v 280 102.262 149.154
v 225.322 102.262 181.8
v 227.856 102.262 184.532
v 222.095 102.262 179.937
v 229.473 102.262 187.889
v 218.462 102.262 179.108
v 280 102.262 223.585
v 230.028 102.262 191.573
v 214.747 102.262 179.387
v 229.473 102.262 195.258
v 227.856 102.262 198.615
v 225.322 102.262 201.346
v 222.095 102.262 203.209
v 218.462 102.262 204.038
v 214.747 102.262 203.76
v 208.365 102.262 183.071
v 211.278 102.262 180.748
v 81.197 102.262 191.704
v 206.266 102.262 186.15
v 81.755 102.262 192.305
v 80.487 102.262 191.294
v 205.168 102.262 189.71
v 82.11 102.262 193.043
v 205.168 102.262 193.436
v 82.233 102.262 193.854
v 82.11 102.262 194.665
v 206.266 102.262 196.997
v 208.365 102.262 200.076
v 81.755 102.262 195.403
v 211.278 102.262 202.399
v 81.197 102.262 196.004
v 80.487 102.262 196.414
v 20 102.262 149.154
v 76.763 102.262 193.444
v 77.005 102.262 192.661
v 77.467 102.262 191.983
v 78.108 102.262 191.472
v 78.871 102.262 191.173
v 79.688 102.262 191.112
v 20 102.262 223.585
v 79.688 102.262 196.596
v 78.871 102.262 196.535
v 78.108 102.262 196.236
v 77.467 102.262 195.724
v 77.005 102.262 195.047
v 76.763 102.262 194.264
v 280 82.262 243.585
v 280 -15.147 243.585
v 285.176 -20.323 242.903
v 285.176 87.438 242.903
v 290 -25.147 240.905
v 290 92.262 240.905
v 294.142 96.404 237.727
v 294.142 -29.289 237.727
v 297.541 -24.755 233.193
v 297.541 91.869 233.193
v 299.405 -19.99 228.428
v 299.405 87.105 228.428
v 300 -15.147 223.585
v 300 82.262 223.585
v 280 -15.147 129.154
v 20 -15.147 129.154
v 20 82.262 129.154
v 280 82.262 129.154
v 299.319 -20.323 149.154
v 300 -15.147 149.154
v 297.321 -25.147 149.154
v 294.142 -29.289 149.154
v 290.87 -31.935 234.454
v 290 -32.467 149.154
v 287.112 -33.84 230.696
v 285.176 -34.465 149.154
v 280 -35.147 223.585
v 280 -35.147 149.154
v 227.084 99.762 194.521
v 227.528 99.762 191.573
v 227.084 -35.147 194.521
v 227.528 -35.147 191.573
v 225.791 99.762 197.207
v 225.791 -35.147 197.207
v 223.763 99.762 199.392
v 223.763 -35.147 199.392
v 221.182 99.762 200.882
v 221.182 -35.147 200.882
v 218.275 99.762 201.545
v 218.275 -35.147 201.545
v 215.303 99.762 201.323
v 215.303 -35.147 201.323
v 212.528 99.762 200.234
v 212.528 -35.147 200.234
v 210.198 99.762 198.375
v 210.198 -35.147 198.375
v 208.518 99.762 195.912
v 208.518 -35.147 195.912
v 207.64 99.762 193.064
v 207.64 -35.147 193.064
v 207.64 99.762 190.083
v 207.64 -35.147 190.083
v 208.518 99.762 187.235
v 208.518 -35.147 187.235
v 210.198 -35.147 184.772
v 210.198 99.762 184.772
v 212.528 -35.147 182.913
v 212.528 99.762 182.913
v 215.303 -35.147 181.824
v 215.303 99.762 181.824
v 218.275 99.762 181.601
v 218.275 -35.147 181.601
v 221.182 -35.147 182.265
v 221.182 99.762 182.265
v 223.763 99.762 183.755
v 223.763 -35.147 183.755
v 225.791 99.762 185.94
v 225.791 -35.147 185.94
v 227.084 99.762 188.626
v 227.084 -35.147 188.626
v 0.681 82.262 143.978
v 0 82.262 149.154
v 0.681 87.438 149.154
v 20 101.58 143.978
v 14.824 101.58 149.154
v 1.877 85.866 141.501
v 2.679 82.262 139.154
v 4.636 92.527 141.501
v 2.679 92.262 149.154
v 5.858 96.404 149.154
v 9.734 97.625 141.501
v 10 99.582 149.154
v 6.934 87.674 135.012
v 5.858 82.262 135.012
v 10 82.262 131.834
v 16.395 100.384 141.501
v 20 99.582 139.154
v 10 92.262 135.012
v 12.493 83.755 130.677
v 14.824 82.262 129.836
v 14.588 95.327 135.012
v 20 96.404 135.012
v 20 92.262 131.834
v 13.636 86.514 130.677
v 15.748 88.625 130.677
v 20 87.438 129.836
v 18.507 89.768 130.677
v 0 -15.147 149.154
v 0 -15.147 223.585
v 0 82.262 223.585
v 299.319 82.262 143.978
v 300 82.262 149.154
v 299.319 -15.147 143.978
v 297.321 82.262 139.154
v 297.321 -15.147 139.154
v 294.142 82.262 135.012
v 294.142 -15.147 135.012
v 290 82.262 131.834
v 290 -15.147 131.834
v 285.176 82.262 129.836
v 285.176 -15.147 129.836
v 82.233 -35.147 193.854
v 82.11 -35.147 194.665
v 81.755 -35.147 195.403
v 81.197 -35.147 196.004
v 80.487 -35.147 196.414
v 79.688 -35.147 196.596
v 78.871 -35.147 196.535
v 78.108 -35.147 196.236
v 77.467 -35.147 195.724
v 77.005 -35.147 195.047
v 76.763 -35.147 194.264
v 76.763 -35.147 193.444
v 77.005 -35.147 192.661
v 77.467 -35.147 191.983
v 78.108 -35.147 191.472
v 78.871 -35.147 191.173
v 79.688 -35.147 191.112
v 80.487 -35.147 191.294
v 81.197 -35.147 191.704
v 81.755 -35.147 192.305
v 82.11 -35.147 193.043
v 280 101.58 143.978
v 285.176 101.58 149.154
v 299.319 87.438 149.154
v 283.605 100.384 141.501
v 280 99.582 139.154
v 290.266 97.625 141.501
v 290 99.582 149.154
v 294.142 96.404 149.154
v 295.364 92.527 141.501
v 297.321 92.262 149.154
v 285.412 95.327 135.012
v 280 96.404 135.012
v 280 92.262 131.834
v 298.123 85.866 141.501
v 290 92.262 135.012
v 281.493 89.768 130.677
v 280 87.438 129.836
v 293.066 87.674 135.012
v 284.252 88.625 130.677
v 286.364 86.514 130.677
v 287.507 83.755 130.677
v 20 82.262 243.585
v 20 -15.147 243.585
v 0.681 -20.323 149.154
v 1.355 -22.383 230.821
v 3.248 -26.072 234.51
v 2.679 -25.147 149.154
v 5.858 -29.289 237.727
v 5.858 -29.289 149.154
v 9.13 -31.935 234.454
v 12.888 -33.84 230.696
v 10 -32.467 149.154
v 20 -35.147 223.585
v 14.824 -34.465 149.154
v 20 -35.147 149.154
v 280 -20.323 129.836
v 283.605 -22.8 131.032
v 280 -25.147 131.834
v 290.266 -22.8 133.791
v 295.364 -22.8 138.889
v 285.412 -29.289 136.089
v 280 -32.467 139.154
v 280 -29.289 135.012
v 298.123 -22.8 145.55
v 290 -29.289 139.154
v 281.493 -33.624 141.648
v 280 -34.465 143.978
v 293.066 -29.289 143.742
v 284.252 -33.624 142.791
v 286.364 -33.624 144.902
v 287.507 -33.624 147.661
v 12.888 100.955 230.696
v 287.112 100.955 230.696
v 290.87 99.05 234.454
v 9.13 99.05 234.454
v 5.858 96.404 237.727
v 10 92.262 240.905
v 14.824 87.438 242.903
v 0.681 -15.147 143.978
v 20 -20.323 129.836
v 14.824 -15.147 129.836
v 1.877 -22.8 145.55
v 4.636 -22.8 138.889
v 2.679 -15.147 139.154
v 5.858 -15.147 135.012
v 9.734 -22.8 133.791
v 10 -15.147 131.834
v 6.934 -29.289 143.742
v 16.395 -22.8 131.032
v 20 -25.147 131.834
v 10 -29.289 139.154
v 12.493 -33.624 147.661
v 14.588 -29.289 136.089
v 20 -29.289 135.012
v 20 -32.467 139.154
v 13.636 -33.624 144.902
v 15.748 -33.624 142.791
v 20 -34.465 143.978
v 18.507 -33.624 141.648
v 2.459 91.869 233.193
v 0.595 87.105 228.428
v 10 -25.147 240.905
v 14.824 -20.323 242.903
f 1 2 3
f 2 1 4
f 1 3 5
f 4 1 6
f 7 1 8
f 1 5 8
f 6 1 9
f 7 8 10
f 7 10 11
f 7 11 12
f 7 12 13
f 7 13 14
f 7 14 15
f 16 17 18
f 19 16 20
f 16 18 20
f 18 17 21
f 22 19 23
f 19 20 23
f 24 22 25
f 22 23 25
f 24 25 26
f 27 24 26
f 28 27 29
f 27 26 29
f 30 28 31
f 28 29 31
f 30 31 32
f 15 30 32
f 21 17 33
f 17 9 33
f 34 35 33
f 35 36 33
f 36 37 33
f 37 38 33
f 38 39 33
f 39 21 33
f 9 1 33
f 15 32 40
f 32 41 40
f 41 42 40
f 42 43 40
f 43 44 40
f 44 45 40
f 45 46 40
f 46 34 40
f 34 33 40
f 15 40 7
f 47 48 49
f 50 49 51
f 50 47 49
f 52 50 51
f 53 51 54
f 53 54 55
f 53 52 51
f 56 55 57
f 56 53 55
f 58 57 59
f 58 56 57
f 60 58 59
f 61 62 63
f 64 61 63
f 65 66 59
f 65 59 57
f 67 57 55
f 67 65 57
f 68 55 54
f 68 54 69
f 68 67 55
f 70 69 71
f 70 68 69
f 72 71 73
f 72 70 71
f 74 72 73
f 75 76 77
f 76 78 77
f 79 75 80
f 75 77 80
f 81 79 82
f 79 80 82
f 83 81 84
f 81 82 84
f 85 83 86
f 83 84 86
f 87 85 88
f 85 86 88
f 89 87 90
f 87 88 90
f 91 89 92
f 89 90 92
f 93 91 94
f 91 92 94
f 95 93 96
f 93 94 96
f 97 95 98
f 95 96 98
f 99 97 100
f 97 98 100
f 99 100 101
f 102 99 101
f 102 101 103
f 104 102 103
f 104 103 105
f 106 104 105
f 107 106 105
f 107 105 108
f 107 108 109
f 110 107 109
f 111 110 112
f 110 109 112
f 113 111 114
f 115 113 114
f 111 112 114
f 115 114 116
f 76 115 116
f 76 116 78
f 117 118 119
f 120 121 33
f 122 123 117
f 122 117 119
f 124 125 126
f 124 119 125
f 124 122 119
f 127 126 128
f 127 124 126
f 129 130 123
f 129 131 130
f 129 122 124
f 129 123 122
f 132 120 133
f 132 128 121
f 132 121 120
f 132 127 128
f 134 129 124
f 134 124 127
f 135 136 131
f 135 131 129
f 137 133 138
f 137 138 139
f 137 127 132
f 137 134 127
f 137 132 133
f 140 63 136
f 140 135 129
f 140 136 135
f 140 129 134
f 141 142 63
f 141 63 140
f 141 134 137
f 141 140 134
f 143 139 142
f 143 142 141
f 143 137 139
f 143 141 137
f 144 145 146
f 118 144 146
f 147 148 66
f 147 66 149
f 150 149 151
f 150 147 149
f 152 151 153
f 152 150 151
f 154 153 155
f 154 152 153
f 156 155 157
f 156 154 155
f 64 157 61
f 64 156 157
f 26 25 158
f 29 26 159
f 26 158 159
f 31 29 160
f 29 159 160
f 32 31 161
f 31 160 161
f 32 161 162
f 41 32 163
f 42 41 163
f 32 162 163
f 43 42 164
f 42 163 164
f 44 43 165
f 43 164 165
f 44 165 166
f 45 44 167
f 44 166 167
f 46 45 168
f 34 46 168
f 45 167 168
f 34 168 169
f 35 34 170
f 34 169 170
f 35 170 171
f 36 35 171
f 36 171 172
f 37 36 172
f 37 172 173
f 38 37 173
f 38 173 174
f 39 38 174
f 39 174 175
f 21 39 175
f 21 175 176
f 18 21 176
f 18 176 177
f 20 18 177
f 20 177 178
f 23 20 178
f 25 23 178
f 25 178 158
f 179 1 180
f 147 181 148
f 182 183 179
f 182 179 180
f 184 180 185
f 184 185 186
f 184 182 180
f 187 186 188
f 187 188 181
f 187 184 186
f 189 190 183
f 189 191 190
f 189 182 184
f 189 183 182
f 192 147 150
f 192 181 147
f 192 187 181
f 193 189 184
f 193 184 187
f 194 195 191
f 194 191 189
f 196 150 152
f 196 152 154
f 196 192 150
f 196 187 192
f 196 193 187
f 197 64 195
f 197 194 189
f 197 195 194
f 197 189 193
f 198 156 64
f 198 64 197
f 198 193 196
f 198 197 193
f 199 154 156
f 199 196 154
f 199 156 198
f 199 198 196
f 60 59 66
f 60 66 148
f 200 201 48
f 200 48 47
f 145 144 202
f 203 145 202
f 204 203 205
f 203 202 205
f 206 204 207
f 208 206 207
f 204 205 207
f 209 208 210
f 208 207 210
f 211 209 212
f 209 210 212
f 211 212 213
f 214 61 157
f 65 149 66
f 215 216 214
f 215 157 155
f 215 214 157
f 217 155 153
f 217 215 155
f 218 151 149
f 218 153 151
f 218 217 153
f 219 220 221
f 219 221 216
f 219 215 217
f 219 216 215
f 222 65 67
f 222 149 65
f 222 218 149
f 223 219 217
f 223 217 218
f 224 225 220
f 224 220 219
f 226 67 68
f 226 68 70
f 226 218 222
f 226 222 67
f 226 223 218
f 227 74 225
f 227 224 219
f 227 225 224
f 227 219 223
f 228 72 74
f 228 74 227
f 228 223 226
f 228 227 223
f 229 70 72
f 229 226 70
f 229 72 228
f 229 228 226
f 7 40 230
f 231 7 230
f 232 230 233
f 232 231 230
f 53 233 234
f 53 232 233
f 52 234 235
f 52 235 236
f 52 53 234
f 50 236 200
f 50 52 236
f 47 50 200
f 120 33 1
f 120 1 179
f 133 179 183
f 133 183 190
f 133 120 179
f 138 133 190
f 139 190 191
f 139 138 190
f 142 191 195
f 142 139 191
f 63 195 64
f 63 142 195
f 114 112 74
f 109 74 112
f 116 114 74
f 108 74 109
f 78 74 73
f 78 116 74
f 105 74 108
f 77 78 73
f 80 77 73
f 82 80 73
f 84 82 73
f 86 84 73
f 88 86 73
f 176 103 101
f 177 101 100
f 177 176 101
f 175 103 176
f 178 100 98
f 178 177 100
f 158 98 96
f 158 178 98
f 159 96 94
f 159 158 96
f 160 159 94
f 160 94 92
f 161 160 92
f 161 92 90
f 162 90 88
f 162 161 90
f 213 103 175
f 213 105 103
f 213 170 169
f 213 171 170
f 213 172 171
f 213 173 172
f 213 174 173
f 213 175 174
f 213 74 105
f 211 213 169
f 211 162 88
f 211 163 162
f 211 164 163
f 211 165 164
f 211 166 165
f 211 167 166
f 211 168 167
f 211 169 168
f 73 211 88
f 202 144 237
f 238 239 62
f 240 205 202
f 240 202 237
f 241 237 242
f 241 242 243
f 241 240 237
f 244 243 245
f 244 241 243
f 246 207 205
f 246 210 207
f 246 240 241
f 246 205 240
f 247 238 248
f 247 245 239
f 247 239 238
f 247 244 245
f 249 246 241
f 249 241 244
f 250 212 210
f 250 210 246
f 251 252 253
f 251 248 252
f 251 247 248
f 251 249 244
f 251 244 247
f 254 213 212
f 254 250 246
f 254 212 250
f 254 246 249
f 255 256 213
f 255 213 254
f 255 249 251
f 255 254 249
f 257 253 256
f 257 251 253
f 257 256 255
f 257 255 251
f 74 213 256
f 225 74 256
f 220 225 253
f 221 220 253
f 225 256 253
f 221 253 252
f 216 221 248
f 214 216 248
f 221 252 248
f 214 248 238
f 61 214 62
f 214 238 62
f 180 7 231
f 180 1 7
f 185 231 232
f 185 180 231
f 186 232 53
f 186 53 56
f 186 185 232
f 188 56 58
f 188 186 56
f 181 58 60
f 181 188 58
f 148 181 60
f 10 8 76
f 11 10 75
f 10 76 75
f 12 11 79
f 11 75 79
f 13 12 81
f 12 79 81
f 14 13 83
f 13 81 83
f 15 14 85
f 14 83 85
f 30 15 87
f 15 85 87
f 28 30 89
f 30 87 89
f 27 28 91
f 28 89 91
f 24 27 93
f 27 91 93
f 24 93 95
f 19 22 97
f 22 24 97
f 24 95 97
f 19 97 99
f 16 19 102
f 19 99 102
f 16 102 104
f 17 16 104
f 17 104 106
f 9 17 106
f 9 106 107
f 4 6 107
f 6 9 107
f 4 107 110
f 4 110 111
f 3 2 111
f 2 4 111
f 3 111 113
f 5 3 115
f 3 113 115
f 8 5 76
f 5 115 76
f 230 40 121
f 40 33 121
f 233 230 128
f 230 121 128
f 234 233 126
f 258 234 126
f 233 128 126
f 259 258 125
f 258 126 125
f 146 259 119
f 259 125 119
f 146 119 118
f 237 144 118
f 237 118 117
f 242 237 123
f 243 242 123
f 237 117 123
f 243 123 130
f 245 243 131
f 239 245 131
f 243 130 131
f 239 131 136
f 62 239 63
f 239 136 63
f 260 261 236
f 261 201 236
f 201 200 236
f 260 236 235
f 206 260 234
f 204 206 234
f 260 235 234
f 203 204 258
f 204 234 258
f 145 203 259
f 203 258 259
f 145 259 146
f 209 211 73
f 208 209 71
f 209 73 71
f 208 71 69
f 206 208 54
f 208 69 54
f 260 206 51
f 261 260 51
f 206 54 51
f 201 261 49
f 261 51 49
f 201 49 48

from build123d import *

# Parameters (mm, degrees)
F0_W           = 137.4083533883
F0_H           = 114.4303381443
F1_DEPTH       = 300
F2_R           = 20
F3_T1_DEPTH    = 124.4303381443
F3_T3_DEPTH    = 97.4083533883
F3_T5_DEPTH    = 260
F3_S9_W        = 20.4
F3_S9_H        = 20.4
F3_T10_DEPTH   = 20.4
F3_S15_W       = 20.4
F3_S15_H       = 20.4
F3_T16_DEPTH   = 20.4
F3_S21_W       = 20.4
F3_S21_H       = 20.4
F3_T22_DEPTH   = 20.4
F3_S27_W       = 20.4
F3_S27_H       = 20.4
F3_T28_DEPTH   = 20.4
F5_D           = 5.5
F7_D           = 20
F7_CSINK_D     = 25
F7_CSINK_ANGLE = 90


# Not quite as in the source:
# - a fillet or chamfer that OpenCascade refuses, or shapes differently, is made with other operations: its cross-section is extruded or revolved along the edge and cut away or added


with BuildPart() as f1:
    # F0 (on Right) → F1 (new body)
    with BuildSketch(Plane.YZ):
        with Locations((33.5574410856, 186.369523406)):
            Rectangle(F0_W, F0_H)
    extrude(amount=F1_DEPTH)

    # F2
    f2_edges = [f1.edges().sort_by_distance(p)[0] for p in [
        (150, 102.261618, 243.584692),
        (150, -35.146736, 243.584692),
        (0, 33.557441, 243.584692),
        (300, 33.557441, 243.584692),
    ]]
    fillet(f2_edges, radius=F2_R)

    # F3: fillet of radius 20 on 9 edges, made by hand

    # F3_s2 → F3_t1 (cut)
    with BuildSketch(Plane.XY.offset(149.1543543339)):
        with BuildLine():
            ThreePointArc((0, -15.1467356086), (5.8578643763, -29.2888712323), (20, -35.1467356086))
            Line((20, -35.1467356086), (0, -35.1467356086))
            Line((0, -35.1467356086), (0, -15.1467356086))
        make_face()
        with BuildLine():
            ThreePointArc((20, 102.2616177797), (5.8578643763, 96.4037534035), (0, 82.2616177797))
            Line((0, 82.2616177797), (0, 102.2616177797))
            Line((0, 102.2616177797), (20, 102.2616177797))
        make_face()
        with BuildLine():
            ThreePointArc((280, 102.2616177797), (294.1421356237, 96.4037534035), (300, 82.2616177797))
            Line((300, 82.2616177797), (300, 102.2616177797))
            Line((300, 102.2616177797), (280, 102.2616177797))
        make_face()
        with BuildLine():
            ThreePointArc((300, -15.1467356086), (294.1421356237, -29.2888712323), (280, -35.1467356086))
            Line((280, -35.1467356086), (300, -35.1467356086))
            Line((300, -35.1467356086), (300, -15.1467356086))
        make_face()
    extrude(amount=F3_T1_DEPTH, mode=Mode.SUBTRACT)

    # F3_s4 → F3_t3 (cut)
    with BuildSketch(Plane.XZ.offset(-82.2616177797)):
        with BuildLine():
            ThreePointArc((0, 149.1543543339), (5.8578643763, 135.0122187101), (20, 129.1543543339))
            Line((20, 129.1543543339), (0, 129.1543543339))
            Line((0, 129.1543543339), (0, 149.1543543339))
        make_face()
        with BuildLine():
            ThreePointArc((300, 149.1543543339), (294.1421356237, 135.0122187101), (280, 129.1543543339))
            Line((280, 129.1543543339), (300, 129.1543543339))
            Line((300, 129.1543543339), (300, 149.1543543339))
        make_face()
    extrude(amount=F3_T3_DEPTH, mode=Mode.SUBTRACT)

    # F3_s6 → F3_t5 (cut)
    with BuildSketch(Plane.YZ.offset(20)):
        with BuildLine():
            ThreePointArc((-35.1467356086, 149.1543543339), (-29.2888712323, 135.0122187101), (-15.1467356086, 129.1543543339))
            Line((-15.1467356086, 129.1543543339), (-35.1467356086, 129.1543543339))
            Line((-35.1467356086, 129.1543543339), (-35.1467356086, 149.1543543339))
        make_face()
        with BuildLine():
            ThreePointArc((102.2616177797, 149.1543543339), (96.4037534035, 135.0122187101), (82.2616177797, 129.1543543339))
            Line((82.2616177797, 129.1543543339), (102.2616177797, 129.1543543339))
            Line((102.2616177797, 129.1543543339), (102.2616177797, 149.1543543339))
        make_face()
    extrude(amount=F3_T5_DEPTH, mode=Mode.SUBTRACT)


with BuildPart() as f3_tool8:
    # F3_s9 → F3_t10 (new body)
    with BuildSketch(Plane.XZ.offset(15.1467356086)):
        with Locations((9.8, 138.9543543339)):
            Rectangle(F3_S9_W, F3_S9_H)
    extrude(amount=F3_T10_DEPTH)

    # F3_s11 → F3_t12 (revolve, cut)
    with BuildSketch(Plane(origin=(20, -15.1467356086, 149.1543543339), x_dir=(0.7071067812, 0, 0.7071067812), z_dir=(0.7071067812, 0, -0.7071067812))):
        with BuildLine():
            ThreePointArc((0, -20), (20, 0), (0, 20))
            Line((0, 20), (0, -20))
        make_face()
    revolve(axis=Axis((20, -15.1467356086, 149.1543543339), (0, -1, 0)), mode=Mode.SUBTRACT)


with BuildPart() as f1_1:
    add(f1.part)

    # F3_t7: cut F3_tool8
    add(f3_tool8.part, mode=Mode.SUBTRACT)


with BuildPart() as f3_tool14:
    # F3_s15 → F3_t16 (new body)
    with BuildSketch(Plane.XY.offset(149.1543543339)):
        with Locations((9.8, 92.4616177797)):
            Rectangle(F3_S15_W, F3_S15_H)
    extrude(amount=-F3_T16_DEPTH)

    # F3_s17 → F3_t18 (revolve, cut)
    with BuildSketch(Plane(origin=(20, 82.2616177797, 149.1543543339), x_dir=(0.7071067812, -0.7071067812, 0), z_dir=(0.7071067812, 0.7071067812, 0))):
        with BuildLine():
            ThreePointArc((0, -20), (20, 0), (0, 20))
            Line((0, 20), (0, -20))
        make_face()
    revolve(axis=Axis((20, 82.2616177797, 149.1543543339), (0, 0, -1)), mode=Mode.SUBTRACT)


with BuildPart() as f1_2:
    add(f1_1.part)

    # F3_t13: cut F3_tool14
    add(f3_tool14.part, mode=Mode.SUBTRACT)


with BuildPart() as f3_tool20:
    # F3_s21 → F3_t22 (new body)
    with BuildSketch(Plane.XZ.offset(15.1467356086)):
        with Locations((290.2, 138.9543543339)):
            Rectangle(F3_S21_W, F3_S21_H)
    extrude(amount=F3_T22_DEPTH)

    # F3_s23 → F3_t24 (revolve, cut)
    with BuildSketch(Plane(origin=(280, -15.1467356086, 149.1543543339), x_dir=(-0.7071067812, 0, 0.7071067812), z_dir=(0.7071067812, 0, 0.7071067812))):
        with BuildLine():
            ThreePointArc((0, -20), (20, 0), (0, 20))
            Line((0, 20), (0, -20))
        make_face()
    revolve(axis=Axis((280, -15.1467356086, 149.1543543339), (0, -1, 0)), mode=Mode.SUBTRACT)


with BuildPart() as f1_3:
    add(f1_2.part)

    # F3_t19: cut F3_tool20
    add(f3_tool20.part, mode=Mode.SUBTRACT)


with BuildPart() as f3_tool26:
    # F3_s27 → F3_t28 (new body)
    with BuildSketch(Plane.XY.offset(149.1543543339)):
        with Locations((290.2, 92.4616177797)):
            Rectangle(F3_S27_W, F3_S27_H)
    extrude(amount=-F3_T28_DEPTH)

    # F3_s29 → F3_t30 (revolve, cut)
    with BuildSketch(Plane(origin=(280, 82.2616177797, 149.1543543339), x_dir=(-0.7071067812, -0.7071067812, 0), z_dir=(0.7071067812, -0.7071067812, 0))):
        with BuildLine():
            ThreePointArc((0, -20), (20, 0), (0, 20))
            Line((0, 20), (0, -20))
        make_face()
    revolve(axis=Axis((280, 82.2616177797, 149.1543543339), (0, 0, -1)), mode=Mode.SUBTRACT)


with BuildPart() as f1_4:
    add(f1_3.part)

    # F3_t25: cut F3_tool26
    add(f3_tool26.part, mode=Mode.SUBTRACT)

    # F5 (through all)
    with Locations(Plane(origin=(0, 102.2616177797, 0), x_dir=(-1, 0, 0), z_dir=(0, 1, 0))):
        with Locations((-79.4825255871, 193.85394454)):
            Hole(F5_D / 2)

    # F7 (through all)
    with Locations(Plane(origin=(0, 102.2616177797, 0), x_dir=(-1, 0, 0), z_dir=(0, 1, 0))):
        with Locations((-217.5281494856, 191.5733516216)):
            CounterSinkHole(F7_D / 2, F7_CSINK_D / 2, counter_sink_angle=F7_CSINK_ANGLE)


solid = f1_4.part
